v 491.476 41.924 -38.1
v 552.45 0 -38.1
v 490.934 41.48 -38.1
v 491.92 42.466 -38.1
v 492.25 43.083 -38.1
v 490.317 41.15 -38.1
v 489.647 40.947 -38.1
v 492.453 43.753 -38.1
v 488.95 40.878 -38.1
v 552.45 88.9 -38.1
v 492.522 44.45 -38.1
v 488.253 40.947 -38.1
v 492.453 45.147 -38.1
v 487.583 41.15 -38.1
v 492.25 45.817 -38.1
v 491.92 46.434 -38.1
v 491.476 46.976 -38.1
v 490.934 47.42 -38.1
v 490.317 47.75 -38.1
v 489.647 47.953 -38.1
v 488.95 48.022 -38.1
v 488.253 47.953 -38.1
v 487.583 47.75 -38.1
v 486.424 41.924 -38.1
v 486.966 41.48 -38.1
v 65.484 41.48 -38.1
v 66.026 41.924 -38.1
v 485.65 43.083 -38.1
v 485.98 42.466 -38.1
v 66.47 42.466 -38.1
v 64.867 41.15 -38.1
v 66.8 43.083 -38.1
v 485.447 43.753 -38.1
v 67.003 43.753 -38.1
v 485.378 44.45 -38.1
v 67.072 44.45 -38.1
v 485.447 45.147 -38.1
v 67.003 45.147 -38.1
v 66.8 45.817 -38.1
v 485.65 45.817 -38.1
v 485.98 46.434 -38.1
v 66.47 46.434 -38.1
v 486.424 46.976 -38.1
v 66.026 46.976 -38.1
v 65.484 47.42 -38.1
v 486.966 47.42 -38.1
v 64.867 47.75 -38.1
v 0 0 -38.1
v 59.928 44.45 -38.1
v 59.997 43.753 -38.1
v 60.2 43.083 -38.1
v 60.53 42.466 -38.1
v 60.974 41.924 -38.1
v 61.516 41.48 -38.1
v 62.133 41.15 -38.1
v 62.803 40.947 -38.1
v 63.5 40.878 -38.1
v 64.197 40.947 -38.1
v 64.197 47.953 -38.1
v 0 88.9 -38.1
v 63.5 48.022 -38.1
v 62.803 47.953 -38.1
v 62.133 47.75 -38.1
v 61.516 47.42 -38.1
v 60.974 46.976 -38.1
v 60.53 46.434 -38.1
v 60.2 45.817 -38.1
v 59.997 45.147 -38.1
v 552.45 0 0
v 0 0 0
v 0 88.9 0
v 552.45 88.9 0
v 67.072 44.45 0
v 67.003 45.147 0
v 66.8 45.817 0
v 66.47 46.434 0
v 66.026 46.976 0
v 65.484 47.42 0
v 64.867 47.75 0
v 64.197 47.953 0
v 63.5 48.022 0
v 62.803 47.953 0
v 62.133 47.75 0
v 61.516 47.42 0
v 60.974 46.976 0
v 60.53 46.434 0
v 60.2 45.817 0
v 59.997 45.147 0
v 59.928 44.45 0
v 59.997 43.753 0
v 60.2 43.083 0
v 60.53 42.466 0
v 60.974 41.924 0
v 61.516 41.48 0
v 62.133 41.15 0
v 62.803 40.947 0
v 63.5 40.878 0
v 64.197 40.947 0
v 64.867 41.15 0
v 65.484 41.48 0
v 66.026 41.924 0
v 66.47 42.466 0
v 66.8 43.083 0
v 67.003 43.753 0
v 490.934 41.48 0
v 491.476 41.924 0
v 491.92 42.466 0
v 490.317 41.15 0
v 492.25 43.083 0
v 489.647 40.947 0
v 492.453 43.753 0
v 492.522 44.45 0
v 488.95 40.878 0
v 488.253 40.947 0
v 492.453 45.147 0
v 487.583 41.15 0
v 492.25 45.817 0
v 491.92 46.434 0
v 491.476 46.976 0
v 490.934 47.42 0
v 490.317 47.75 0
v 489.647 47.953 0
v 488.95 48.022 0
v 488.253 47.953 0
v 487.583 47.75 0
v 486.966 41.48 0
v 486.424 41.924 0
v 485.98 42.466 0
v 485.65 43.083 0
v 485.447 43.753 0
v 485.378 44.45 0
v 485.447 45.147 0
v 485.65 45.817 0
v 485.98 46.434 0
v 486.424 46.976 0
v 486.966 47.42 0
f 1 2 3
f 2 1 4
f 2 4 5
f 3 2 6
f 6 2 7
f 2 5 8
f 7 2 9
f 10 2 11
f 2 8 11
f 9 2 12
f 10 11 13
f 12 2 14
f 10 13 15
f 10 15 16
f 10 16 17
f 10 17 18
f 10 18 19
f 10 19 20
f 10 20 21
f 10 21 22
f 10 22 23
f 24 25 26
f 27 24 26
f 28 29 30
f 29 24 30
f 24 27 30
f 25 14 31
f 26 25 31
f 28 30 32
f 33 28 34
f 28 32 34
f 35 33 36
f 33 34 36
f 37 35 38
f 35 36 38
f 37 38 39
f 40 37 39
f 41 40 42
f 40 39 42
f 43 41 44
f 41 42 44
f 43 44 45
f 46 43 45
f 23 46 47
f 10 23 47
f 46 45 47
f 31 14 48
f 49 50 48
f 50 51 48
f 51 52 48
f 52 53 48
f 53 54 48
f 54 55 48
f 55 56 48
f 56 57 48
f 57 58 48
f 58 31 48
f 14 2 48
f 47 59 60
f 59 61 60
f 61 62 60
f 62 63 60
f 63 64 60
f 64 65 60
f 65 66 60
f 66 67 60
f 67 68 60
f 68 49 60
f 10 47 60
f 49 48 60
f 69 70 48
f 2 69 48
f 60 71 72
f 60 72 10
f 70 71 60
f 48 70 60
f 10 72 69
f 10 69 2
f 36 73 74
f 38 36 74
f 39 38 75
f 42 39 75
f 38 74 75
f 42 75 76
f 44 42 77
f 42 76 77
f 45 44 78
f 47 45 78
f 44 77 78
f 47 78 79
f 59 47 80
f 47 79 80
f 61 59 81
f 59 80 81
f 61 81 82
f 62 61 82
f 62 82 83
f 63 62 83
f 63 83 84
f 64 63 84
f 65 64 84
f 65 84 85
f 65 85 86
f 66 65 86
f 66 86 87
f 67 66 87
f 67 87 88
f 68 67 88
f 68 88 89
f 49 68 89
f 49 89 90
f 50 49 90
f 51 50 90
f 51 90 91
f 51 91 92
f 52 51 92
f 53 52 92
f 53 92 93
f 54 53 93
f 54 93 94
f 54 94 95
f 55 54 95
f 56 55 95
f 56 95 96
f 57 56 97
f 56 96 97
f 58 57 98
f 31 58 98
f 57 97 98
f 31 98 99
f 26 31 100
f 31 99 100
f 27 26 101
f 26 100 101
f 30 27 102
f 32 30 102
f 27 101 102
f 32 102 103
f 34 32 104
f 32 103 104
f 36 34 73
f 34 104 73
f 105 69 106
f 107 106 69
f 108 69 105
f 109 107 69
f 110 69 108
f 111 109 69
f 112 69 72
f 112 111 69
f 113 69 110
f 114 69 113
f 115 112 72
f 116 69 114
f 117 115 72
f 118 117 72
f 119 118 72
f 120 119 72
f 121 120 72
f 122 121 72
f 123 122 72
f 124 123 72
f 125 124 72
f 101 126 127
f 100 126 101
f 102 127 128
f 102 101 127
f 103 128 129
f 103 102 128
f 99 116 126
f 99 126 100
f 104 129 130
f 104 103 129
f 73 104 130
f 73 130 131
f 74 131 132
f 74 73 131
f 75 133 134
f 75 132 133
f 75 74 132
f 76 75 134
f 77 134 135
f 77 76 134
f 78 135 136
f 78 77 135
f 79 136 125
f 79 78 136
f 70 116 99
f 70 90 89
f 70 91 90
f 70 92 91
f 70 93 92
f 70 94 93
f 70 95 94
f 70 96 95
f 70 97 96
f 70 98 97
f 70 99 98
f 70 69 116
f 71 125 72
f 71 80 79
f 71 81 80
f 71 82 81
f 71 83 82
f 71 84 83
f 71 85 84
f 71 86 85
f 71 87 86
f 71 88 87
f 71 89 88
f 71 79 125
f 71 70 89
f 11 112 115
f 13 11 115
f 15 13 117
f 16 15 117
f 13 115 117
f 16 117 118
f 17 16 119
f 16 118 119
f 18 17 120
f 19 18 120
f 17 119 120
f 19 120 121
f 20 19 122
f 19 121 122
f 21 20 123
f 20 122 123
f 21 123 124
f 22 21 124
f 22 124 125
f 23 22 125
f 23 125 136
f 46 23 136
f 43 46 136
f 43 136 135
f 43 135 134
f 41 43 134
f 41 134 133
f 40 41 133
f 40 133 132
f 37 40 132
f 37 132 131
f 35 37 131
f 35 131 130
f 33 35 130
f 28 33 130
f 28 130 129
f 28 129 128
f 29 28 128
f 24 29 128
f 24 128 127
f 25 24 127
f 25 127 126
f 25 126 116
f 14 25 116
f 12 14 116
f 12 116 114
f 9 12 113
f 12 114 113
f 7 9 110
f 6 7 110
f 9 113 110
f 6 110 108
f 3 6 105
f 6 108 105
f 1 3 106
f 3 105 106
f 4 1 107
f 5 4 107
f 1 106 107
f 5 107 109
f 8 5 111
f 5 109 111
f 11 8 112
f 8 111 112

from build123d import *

# Parameters (mm, degrees)
SKETCH1_W           = 38.1
SKETCH1_H           = 88.9
BOSS_EXTRUDE1_DEPTH = 552.45
SKETCH2_R           = 3.571875
CUT_EXTRUDE1_DEPTH  = 561.852763655


with BuildPart() as part:
    # Sketch1 → Boss-Extrude1 (new body)
    with BuildSketch(Plane(origin=(0, 0, 0), x_dir=(0, 0, -1), z_dir=(1, 0, 0))):
        with Locations((19.05, 44.45)):
            Rectangle(SKETCH1_W, SKETCH1_H)
    extrude(amount=BOSS_EXTRUDE1_DEPTH)

    # Sketch2 → Cut-Extrude1 (cut, through all)
    with BuildSketch(Plane.XY):
        with Locations((63.5, 44.45)):
            Circle(SKETCH2_R)
        with Locations((488.95, 44.45)):
            Circle(SKETCH2_R)
    extrude(amount=-CUT_EXTRUDE1_DEPTH, mode=Mode.SUBTRACT)


solid = part.part
